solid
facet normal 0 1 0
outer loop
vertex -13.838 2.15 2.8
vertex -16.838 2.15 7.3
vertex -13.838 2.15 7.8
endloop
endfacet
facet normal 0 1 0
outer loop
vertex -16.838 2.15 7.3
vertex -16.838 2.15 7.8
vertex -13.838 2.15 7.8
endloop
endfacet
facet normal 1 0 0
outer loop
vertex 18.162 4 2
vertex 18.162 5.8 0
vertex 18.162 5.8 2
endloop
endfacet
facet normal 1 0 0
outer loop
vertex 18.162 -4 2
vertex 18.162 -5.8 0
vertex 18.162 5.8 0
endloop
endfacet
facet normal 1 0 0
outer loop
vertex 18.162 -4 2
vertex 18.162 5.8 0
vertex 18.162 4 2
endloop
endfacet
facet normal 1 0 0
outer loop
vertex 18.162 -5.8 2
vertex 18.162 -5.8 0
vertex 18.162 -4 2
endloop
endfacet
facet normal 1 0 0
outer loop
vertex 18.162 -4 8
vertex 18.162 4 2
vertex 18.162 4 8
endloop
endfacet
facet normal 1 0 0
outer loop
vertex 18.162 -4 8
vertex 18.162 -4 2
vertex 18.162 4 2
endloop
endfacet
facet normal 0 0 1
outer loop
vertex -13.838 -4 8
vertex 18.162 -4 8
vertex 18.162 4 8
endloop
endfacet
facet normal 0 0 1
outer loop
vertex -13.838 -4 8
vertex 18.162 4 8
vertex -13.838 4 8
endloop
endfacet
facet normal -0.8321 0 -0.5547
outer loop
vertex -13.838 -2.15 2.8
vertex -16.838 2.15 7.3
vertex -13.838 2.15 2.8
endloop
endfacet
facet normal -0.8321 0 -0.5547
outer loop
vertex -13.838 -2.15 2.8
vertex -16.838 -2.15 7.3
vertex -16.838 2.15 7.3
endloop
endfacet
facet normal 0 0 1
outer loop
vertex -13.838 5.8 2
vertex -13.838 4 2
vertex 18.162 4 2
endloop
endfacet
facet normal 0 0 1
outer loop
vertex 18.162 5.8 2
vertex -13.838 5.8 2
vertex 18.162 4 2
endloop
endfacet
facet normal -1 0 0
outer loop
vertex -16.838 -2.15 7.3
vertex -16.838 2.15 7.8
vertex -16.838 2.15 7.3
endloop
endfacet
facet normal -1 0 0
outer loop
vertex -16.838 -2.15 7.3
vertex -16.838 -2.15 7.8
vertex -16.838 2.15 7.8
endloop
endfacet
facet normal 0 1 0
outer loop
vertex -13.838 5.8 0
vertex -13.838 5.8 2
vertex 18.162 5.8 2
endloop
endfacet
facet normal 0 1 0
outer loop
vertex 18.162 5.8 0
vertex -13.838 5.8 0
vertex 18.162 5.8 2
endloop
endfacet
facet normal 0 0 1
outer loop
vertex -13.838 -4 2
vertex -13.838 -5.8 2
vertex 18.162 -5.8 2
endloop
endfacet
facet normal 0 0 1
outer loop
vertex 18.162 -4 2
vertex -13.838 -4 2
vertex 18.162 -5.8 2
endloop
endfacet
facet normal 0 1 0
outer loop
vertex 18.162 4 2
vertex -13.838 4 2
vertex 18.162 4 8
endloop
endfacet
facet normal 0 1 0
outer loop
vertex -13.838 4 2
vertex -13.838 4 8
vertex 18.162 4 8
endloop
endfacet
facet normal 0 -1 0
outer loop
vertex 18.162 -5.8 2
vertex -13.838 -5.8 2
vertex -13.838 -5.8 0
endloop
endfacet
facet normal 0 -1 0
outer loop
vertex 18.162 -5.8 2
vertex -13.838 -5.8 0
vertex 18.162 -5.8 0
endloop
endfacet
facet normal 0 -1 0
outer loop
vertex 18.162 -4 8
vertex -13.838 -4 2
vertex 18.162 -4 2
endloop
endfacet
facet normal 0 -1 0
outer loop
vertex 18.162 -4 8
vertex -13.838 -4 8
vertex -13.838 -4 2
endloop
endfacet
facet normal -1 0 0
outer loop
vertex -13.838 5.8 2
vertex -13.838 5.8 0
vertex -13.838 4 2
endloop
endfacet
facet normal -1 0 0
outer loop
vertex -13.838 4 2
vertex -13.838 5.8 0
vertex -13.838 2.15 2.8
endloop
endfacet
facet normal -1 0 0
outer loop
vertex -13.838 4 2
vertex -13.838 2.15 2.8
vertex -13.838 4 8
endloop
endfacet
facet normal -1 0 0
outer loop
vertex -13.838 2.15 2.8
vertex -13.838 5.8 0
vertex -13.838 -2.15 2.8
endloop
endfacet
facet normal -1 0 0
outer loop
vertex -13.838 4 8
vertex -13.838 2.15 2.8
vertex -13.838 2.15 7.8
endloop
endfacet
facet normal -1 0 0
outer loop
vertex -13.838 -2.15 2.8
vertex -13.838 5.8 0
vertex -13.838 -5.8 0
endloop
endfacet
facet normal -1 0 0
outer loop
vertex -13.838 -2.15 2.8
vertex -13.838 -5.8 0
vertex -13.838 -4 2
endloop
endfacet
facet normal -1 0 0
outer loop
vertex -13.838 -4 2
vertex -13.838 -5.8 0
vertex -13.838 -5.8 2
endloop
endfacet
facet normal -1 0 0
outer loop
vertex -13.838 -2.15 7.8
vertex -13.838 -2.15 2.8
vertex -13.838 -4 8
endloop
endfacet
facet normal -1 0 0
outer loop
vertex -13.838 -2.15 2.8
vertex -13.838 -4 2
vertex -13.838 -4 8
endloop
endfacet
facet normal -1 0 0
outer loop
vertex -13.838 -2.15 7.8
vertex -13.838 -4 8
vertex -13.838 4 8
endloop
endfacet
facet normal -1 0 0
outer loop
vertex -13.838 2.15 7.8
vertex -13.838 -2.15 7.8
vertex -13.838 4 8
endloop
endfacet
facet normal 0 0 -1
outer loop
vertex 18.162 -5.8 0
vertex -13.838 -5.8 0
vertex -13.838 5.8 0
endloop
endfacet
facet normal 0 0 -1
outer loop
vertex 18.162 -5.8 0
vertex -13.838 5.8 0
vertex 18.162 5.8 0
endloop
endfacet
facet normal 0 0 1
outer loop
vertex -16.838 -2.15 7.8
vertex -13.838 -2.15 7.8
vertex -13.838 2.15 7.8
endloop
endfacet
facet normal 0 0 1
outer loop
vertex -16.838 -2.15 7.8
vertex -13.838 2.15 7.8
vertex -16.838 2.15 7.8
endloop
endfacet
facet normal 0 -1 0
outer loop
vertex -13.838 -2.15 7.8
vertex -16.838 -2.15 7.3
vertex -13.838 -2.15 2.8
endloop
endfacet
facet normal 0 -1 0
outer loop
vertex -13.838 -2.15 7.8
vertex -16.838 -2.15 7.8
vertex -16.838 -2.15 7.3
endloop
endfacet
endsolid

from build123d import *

# Parameters (mm, degrees)
F1_DEPTH = 4
F2_DEPTH = 2.15
F0_W     = 32
F0_H     = 2
F3_DEPTH = 5.8


with BuildPart() as f1:
    # F0 (on Front) → F1 (new body, symmetric)
    with BuildSketch(Plane.XZ):
        Polygon((-13.8378396917, 2.8), (-13.8378396917, 2), (18.1621603083, 2), (18.1621603083, 8), (-13.8378396917, 8), (-13.8378396917, 7.8), align=None)
    extrude(amount=F1_DEPTH, both=True)

    # F0 (on Front) → F2 (join, symmetric)
    with BuildSketch(Plane.XZ):
        Polygon((-16.8378396917, 7.3), (-13.8378396917, 2.8), (-13.8378396917, 7.8), (-16.8378396917, 7.8), align=None)
    extrude(amount=F2_DEPTH, both=True)

    # F0 (on Front) → F3 (join, symmetric)
    with BuildSketch(Plane.XZ):
        with Locations((2.1621603083, 1)):
            Rectangle(F0_W, F0_H)
    extrude(amount=F3_DEPTH, both=True)


solid = f1.part
